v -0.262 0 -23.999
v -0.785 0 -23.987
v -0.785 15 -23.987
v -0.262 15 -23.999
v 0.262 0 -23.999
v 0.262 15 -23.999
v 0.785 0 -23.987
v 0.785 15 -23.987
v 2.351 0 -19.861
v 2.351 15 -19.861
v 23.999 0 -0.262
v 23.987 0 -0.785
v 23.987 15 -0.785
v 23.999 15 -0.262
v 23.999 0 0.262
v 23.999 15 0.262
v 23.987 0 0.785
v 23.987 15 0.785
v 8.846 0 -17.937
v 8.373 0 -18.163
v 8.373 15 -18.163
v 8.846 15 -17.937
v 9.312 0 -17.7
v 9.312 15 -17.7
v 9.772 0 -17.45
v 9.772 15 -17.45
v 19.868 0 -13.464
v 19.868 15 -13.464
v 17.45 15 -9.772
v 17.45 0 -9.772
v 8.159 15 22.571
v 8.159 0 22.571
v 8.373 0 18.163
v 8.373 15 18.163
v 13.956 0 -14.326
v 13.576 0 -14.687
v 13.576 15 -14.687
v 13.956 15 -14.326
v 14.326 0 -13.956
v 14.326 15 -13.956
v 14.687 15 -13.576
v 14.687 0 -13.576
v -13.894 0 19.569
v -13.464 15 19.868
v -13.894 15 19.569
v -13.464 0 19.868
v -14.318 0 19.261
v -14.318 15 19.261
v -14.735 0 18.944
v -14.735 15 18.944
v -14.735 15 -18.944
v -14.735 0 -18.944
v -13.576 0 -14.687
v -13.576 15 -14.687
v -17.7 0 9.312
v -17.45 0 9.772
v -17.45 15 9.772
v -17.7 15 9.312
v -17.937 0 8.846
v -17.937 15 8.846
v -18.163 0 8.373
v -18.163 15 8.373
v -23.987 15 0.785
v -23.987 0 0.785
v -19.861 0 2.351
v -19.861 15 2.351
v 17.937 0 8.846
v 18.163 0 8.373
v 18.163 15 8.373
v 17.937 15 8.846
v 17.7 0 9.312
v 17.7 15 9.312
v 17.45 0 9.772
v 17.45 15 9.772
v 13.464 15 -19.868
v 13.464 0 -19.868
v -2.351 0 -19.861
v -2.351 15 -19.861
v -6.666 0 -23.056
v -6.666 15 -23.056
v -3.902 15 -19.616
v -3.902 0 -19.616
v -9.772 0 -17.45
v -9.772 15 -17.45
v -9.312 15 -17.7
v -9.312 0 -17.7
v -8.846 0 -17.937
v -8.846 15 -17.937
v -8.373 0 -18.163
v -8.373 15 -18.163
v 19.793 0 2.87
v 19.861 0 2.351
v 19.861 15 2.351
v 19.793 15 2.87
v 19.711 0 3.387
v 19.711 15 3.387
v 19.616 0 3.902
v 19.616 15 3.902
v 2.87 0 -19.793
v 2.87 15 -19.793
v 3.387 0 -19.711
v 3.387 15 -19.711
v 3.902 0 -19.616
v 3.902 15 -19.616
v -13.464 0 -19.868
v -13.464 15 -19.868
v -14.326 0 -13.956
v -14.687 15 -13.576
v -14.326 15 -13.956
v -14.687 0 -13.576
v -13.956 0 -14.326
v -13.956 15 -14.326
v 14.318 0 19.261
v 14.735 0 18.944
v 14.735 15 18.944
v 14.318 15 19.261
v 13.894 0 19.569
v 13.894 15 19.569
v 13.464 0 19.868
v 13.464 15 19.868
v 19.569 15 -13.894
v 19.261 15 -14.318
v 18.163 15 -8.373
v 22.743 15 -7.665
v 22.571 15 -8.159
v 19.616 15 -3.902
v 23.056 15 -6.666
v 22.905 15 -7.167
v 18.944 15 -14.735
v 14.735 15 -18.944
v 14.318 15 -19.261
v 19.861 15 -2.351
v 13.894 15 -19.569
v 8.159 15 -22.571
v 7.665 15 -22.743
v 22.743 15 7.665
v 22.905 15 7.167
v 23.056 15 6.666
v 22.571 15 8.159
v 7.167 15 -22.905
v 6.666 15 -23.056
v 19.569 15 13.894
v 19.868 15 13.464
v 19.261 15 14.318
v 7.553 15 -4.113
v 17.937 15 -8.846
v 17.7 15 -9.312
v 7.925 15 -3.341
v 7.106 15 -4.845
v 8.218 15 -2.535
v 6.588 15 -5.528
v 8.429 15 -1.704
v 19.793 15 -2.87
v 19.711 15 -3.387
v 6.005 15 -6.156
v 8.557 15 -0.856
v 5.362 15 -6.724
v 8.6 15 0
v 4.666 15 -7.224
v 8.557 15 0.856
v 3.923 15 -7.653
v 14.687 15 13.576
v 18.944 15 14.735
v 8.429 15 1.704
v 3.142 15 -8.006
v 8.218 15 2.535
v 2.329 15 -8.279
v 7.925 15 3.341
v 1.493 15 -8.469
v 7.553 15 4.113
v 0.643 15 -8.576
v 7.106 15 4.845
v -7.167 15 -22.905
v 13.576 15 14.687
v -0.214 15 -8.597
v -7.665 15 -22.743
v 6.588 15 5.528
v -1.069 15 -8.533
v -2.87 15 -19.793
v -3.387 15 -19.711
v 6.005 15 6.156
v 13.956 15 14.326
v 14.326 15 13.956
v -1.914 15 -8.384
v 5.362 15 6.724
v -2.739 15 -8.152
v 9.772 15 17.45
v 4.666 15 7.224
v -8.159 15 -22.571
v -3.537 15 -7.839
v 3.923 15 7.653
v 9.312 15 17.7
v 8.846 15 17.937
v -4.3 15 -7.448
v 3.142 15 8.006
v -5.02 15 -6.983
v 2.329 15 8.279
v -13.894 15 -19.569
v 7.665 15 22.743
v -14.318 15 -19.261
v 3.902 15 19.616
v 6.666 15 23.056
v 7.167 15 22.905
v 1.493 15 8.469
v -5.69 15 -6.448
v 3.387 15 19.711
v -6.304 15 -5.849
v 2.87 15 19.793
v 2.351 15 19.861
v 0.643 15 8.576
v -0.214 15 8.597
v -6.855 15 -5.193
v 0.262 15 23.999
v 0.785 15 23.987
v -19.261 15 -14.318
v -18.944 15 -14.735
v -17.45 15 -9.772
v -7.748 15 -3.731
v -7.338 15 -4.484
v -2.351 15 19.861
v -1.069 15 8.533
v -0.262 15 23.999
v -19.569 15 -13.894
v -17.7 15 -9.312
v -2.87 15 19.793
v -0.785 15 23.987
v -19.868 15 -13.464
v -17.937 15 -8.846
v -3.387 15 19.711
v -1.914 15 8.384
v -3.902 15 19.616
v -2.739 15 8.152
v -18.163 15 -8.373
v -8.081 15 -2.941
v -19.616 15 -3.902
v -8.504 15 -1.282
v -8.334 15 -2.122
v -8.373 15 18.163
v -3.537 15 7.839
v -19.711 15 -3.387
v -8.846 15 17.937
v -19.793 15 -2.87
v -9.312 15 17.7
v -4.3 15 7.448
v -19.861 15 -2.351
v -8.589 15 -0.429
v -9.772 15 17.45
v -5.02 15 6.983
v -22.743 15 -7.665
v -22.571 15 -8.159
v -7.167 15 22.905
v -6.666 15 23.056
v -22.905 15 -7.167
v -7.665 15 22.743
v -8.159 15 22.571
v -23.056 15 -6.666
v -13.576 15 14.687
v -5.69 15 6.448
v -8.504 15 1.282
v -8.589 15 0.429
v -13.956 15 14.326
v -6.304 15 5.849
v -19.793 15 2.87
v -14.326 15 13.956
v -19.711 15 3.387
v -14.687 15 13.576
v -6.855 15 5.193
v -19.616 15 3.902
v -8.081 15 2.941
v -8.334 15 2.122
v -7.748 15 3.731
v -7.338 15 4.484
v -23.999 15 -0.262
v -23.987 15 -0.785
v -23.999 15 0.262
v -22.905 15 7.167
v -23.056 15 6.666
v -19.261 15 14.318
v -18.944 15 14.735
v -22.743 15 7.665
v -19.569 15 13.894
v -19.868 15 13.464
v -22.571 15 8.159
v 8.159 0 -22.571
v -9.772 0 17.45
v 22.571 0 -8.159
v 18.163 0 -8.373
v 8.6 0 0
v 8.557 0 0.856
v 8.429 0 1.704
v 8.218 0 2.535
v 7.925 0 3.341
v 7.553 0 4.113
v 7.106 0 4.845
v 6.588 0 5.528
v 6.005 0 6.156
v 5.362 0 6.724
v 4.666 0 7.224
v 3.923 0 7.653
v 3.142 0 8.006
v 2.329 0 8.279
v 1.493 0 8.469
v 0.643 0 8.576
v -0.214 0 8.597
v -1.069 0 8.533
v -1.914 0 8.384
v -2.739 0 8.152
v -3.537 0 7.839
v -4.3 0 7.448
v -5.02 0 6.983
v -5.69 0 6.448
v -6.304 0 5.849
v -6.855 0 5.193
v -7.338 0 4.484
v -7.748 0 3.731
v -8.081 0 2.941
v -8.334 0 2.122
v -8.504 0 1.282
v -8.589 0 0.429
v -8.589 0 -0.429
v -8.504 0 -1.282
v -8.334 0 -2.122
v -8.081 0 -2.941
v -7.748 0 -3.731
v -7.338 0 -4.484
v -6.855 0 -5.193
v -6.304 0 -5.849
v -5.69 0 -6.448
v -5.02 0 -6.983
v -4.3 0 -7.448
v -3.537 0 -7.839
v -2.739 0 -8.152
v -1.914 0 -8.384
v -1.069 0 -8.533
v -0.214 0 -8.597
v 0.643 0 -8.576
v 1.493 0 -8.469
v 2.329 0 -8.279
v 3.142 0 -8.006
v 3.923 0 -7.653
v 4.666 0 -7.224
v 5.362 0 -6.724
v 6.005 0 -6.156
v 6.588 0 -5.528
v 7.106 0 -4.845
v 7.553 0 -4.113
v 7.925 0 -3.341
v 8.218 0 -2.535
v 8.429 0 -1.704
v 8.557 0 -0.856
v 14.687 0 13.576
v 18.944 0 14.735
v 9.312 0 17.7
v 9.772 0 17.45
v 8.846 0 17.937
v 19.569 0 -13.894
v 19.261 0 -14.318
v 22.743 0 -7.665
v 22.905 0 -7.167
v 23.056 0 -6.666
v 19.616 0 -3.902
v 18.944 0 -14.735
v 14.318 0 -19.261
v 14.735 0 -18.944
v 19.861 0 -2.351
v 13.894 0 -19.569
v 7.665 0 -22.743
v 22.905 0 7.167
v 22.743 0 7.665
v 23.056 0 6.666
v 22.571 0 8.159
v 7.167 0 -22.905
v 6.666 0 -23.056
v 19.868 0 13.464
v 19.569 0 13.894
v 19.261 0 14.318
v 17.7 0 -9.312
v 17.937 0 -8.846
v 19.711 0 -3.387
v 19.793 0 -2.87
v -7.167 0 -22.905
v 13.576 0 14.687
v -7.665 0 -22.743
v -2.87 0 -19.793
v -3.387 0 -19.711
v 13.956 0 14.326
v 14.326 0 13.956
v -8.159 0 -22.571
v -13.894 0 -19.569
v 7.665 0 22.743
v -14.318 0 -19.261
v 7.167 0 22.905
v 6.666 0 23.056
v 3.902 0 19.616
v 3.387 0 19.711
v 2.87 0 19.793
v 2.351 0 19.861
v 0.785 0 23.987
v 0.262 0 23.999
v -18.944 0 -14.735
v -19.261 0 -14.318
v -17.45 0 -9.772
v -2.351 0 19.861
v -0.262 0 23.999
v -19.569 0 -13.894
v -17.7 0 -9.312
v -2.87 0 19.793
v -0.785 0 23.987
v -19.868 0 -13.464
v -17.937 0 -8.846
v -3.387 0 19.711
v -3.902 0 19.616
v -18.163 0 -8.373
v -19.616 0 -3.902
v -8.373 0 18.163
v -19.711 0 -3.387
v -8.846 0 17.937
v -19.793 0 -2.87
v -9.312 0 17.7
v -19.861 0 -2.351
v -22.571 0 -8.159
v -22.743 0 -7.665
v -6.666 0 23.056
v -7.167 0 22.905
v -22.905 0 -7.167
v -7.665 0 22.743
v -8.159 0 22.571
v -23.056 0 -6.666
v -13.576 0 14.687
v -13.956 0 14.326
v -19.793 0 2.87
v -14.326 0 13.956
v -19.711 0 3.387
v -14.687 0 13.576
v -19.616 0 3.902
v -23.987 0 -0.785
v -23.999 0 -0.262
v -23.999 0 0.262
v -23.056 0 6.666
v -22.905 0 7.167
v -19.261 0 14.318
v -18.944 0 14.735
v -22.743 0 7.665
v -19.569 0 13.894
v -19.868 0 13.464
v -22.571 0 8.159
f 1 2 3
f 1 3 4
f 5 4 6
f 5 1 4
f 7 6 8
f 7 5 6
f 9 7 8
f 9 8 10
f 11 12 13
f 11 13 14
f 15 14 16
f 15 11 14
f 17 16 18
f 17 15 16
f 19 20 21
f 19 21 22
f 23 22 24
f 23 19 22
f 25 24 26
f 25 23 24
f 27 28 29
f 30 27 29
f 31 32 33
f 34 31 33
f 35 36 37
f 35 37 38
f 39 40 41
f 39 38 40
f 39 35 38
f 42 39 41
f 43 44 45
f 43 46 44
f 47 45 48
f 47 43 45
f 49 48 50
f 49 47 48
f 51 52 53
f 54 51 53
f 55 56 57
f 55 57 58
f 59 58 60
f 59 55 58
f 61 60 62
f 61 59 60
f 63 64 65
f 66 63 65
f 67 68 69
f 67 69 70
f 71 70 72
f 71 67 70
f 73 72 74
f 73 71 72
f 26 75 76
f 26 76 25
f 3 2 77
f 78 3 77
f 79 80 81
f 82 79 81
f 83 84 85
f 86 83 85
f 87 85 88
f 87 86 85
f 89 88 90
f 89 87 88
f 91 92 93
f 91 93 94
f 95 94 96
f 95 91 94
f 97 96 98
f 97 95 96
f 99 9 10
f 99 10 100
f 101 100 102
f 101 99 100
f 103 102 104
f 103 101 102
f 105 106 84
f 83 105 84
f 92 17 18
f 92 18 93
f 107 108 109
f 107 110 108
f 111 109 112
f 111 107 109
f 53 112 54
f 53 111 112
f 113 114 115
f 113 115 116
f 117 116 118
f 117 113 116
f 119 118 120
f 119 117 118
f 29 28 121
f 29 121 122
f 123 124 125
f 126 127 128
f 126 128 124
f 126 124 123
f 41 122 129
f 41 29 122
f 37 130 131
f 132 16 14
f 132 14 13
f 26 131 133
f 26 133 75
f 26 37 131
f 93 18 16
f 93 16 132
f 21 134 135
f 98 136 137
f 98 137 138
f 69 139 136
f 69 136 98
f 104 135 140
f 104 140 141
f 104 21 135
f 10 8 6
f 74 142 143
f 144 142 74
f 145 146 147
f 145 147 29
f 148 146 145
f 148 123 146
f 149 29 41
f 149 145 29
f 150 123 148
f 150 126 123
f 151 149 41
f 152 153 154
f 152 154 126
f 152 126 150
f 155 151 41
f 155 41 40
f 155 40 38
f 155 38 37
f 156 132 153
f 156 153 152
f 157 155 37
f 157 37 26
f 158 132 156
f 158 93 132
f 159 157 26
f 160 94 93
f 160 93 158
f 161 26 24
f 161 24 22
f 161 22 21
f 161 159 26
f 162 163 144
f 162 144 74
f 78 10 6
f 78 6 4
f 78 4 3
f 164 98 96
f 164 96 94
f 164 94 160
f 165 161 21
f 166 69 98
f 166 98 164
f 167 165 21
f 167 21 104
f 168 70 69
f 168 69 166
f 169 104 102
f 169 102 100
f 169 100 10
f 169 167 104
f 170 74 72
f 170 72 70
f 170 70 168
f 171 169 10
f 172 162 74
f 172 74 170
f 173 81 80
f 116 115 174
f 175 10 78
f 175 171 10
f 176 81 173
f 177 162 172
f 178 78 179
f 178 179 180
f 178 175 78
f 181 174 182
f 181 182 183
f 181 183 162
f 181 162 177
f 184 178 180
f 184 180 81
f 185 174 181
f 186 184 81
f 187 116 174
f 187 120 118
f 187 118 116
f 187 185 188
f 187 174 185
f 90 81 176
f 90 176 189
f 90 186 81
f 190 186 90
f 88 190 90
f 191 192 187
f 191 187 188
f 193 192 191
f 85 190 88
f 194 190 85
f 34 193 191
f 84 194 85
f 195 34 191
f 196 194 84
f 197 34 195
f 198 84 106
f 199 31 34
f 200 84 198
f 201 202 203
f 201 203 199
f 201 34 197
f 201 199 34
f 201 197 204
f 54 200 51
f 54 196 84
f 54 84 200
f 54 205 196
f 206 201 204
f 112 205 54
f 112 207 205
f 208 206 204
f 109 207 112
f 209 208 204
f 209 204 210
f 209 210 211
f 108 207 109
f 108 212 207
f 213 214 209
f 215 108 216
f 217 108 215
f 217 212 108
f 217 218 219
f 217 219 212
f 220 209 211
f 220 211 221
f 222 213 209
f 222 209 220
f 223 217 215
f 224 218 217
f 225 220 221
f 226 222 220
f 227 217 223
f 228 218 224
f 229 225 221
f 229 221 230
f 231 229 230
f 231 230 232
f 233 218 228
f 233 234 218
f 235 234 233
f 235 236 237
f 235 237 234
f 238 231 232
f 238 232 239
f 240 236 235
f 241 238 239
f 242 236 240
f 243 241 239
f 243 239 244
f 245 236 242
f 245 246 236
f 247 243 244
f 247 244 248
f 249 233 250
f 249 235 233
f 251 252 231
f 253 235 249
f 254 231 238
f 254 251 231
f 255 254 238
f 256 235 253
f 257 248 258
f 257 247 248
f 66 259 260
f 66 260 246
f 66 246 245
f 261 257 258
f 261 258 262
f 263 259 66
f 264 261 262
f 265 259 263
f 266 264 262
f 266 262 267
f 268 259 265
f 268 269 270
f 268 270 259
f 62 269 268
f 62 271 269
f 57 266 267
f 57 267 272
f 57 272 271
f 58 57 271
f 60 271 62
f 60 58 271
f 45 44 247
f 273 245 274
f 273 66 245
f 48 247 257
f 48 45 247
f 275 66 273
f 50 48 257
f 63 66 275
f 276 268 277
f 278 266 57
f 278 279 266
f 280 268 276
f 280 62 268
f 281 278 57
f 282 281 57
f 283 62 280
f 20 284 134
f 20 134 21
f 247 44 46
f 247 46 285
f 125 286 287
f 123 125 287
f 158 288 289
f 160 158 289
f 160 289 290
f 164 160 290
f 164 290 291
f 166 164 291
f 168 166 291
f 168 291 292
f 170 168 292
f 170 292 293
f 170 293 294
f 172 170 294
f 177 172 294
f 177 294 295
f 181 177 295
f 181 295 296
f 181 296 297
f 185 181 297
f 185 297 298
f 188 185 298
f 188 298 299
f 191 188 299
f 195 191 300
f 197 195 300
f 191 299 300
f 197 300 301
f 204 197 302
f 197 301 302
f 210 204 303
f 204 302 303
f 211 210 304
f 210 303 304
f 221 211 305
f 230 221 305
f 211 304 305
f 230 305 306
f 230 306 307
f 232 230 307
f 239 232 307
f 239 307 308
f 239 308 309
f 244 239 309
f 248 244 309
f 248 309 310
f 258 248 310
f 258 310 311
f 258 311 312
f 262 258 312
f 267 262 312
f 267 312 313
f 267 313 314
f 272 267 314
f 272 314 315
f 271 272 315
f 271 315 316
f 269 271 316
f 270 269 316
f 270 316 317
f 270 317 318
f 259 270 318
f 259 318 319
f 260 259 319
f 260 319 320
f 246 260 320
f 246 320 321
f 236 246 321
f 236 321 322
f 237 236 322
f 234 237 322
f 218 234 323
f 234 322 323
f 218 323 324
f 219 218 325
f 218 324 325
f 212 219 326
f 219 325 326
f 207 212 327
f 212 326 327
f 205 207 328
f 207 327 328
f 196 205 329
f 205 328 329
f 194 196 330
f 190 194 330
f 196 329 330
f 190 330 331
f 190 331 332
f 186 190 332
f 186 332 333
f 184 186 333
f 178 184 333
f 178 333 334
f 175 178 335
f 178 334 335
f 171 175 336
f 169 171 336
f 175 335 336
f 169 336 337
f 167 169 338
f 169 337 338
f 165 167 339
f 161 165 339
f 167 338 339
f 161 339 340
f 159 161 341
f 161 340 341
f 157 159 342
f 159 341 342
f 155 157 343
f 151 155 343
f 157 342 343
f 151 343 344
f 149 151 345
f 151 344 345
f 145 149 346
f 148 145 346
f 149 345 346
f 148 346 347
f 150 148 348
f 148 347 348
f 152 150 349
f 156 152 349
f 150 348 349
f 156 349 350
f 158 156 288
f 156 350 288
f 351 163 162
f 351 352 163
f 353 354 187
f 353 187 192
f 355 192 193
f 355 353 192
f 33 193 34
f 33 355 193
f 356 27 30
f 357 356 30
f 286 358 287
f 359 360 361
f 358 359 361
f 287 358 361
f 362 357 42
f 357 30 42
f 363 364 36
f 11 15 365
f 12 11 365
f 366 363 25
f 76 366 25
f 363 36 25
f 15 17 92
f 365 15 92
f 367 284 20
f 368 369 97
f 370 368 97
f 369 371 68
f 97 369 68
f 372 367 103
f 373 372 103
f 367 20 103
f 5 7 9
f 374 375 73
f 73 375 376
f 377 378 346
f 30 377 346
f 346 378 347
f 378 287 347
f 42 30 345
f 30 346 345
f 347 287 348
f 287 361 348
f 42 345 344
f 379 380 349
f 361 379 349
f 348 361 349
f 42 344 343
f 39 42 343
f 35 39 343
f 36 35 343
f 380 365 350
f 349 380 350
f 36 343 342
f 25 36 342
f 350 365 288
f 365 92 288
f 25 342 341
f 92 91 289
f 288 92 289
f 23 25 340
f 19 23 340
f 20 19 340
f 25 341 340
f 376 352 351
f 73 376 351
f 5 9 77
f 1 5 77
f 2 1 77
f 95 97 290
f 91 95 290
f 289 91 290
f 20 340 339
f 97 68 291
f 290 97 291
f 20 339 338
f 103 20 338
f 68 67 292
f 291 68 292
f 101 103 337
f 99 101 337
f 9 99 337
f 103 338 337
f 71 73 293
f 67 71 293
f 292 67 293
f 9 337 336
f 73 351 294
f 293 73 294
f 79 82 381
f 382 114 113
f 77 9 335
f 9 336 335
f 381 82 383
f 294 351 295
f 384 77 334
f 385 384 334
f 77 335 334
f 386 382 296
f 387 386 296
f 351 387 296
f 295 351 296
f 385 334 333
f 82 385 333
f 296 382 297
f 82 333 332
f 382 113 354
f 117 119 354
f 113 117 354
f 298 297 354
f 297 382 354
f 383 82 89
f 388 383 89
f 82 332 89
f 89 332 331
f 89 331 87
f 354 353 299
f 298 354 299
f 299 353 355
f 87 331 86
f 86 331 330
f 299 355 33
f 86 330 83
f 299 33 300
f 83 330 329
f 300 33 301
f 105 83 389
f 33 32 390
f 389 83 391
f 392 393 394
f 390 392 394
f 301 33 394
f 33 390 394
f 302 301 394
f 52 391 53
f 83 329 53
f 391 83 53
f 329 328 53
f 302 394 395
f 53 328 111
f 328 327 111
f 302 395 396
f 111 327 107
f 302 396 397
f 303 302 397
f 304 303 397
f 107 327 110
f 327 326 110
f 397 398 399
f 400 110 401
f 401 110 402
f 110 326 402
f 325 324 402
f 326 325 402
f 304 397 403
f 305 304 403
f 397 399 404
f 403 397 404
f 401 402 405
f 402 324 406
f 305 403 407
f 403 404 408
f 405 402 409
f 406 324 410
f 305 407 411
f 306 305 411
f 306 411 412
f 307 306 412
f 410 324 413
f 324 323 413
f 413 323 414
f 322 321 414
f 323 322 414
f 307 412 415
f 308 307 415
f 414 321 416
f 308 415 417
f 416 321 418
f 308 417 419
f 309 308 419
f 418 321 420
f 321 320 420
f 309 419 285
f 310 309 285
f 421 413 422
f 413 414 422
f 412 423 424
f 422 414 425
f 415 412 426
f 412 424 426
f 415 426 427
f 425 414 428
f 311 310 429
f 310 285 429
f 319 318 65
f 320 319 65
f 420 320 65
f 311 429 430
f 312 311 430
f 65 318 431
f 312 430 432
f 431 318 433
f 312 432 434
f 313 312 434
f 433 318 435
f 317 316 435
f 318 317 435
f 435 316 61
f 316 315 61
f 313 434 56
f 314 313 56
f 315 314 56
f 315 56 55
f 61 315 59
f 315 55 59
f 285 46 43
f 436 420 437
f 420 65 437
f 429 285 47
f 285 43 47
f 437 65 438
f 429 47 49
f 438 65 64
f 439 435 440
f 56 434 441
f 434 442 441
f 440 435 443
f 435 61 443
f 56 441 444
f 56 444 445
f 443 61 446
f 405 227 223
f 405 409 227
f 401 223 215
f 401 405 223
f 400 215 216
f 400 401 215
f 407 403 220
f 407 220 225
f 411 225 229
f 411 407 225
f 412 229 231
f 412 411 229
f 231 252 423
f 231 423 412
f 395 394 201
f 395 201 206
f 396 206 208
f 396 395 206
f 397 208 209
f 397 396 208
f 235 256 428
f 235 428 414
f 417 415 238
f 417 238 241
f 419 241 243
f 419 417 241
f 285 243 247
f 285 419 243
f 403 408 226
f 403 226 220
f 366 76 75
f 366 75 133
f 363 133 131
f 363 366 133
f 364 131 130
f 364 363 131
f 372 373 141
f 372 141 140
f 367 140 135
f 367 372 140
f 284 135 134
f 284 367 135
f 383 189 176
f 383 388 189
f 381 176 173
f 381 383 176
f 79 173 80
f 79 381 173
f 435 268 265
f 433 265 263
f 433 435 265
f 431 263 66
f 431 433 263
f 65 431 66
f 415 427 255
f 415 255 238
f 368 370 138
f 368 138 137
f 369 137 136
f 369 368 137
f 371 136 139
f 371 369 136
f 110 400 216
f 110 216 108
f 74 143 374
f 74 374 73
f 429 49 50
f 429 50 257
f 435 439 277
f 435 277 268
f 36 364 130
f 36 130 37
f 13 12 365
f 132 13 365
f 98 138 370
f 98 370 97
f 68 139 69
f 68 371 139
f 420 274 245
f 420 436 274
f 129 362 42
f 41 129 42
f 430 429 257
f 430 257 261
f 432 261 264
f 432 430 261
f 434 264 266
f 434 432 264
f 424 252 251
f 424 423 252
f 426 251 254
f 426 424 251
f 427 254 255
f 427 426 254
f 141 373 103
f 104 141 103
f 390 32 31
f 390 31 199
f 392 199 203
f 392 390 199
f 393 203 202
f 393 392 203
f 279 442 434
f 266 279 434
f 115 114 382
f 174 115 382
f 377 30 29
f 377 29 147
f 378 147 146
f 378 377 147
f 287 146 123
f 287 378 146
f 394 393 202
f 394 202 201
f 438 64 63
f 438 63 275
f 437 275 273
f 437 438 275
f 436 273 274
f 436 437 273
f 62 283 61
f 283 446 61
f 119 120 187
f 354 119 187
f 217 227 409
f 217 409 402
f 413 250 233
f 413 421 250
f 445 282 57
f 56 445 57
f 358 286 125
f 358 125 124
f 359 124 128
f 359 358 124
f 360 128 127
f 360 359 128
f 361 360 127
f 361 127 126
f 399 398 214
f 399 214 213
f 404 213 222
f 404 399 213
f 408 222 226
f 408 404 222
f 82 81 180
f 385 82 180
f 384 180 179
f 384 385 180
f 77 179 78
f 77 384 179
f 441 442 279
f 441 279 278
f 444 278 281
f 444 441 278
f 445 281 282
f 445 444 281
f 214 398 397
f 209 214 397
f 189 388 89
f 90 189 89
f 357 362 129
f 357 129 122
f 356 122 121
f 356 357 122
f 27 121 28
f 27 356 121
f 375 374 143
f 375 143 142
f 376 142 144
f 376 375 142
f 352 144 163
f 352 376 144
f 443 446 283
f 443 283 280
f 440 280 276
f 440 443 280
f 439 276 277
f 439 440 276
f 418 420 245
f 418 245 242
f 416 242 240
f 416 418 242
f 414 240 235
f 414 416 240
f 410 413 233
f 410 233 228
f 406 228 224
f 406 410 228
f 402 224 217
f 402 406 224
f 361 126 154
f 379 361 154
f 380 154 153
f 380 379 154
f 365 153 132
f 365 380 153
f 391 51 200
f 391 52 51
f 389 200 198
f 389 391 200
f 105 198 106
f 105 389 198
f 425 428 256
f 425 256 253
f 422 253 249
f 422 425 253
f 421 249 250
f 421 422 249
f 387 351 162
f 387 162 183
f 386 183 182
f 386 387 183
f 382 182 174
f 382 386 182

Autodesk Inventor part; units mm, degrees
ref_plane "YZ Plane" through (0, 0, 0) normal (1, 0, 0) x (0, 1, 0)
ref_plane "XZ Plane" through (0, 0, 0) normal (0, 1, 0) x (-1, 0, 0)
ref_plane "XY Plane" through (0, 0, 0) normal (0, 0, 1) x (1, 0, 0)
sketch "Sketch1" plane through (0, 0, 0) normal (0, 1, 0) x (-1, 0, 0)
  arc A0 (19.8614, 2.3507) -> (19.8614, -2.3507) centre (0, 0) ccw
  arc A1 (23.9872, -0.7853) -> (23.9872, 0.7853) centre (0, 0) ccw
  line L0 (0, 0) -> (20, 0) construction
  line L1 (0, 0) -> (24, 0) construction
  line L2 (23.9872, -0.7853) -> (19.8614, -2.3507)
  line L3 (23.9872, 0.7853) -> (19.8614, 2.3507)
extrude "Extrusion1" add sketch "Sketch1" along normal blind 15
pattern_circular "Circular Pattern1" count 20 over 360 about axis through (0, 0, 0) along (0, 1, 0) of "Extrusion1"
sketch "Sketch2" plane through (0, 0, 0) normal (0, -1, 0) x (1, 0, 0)
  circle A0 centre (0, 0) radius 8.6
extrude "Extrusion2" cut sketch "Sketch2" against normal blind 15
properties part number "gear_small" material "Gypsum Wall Board"
